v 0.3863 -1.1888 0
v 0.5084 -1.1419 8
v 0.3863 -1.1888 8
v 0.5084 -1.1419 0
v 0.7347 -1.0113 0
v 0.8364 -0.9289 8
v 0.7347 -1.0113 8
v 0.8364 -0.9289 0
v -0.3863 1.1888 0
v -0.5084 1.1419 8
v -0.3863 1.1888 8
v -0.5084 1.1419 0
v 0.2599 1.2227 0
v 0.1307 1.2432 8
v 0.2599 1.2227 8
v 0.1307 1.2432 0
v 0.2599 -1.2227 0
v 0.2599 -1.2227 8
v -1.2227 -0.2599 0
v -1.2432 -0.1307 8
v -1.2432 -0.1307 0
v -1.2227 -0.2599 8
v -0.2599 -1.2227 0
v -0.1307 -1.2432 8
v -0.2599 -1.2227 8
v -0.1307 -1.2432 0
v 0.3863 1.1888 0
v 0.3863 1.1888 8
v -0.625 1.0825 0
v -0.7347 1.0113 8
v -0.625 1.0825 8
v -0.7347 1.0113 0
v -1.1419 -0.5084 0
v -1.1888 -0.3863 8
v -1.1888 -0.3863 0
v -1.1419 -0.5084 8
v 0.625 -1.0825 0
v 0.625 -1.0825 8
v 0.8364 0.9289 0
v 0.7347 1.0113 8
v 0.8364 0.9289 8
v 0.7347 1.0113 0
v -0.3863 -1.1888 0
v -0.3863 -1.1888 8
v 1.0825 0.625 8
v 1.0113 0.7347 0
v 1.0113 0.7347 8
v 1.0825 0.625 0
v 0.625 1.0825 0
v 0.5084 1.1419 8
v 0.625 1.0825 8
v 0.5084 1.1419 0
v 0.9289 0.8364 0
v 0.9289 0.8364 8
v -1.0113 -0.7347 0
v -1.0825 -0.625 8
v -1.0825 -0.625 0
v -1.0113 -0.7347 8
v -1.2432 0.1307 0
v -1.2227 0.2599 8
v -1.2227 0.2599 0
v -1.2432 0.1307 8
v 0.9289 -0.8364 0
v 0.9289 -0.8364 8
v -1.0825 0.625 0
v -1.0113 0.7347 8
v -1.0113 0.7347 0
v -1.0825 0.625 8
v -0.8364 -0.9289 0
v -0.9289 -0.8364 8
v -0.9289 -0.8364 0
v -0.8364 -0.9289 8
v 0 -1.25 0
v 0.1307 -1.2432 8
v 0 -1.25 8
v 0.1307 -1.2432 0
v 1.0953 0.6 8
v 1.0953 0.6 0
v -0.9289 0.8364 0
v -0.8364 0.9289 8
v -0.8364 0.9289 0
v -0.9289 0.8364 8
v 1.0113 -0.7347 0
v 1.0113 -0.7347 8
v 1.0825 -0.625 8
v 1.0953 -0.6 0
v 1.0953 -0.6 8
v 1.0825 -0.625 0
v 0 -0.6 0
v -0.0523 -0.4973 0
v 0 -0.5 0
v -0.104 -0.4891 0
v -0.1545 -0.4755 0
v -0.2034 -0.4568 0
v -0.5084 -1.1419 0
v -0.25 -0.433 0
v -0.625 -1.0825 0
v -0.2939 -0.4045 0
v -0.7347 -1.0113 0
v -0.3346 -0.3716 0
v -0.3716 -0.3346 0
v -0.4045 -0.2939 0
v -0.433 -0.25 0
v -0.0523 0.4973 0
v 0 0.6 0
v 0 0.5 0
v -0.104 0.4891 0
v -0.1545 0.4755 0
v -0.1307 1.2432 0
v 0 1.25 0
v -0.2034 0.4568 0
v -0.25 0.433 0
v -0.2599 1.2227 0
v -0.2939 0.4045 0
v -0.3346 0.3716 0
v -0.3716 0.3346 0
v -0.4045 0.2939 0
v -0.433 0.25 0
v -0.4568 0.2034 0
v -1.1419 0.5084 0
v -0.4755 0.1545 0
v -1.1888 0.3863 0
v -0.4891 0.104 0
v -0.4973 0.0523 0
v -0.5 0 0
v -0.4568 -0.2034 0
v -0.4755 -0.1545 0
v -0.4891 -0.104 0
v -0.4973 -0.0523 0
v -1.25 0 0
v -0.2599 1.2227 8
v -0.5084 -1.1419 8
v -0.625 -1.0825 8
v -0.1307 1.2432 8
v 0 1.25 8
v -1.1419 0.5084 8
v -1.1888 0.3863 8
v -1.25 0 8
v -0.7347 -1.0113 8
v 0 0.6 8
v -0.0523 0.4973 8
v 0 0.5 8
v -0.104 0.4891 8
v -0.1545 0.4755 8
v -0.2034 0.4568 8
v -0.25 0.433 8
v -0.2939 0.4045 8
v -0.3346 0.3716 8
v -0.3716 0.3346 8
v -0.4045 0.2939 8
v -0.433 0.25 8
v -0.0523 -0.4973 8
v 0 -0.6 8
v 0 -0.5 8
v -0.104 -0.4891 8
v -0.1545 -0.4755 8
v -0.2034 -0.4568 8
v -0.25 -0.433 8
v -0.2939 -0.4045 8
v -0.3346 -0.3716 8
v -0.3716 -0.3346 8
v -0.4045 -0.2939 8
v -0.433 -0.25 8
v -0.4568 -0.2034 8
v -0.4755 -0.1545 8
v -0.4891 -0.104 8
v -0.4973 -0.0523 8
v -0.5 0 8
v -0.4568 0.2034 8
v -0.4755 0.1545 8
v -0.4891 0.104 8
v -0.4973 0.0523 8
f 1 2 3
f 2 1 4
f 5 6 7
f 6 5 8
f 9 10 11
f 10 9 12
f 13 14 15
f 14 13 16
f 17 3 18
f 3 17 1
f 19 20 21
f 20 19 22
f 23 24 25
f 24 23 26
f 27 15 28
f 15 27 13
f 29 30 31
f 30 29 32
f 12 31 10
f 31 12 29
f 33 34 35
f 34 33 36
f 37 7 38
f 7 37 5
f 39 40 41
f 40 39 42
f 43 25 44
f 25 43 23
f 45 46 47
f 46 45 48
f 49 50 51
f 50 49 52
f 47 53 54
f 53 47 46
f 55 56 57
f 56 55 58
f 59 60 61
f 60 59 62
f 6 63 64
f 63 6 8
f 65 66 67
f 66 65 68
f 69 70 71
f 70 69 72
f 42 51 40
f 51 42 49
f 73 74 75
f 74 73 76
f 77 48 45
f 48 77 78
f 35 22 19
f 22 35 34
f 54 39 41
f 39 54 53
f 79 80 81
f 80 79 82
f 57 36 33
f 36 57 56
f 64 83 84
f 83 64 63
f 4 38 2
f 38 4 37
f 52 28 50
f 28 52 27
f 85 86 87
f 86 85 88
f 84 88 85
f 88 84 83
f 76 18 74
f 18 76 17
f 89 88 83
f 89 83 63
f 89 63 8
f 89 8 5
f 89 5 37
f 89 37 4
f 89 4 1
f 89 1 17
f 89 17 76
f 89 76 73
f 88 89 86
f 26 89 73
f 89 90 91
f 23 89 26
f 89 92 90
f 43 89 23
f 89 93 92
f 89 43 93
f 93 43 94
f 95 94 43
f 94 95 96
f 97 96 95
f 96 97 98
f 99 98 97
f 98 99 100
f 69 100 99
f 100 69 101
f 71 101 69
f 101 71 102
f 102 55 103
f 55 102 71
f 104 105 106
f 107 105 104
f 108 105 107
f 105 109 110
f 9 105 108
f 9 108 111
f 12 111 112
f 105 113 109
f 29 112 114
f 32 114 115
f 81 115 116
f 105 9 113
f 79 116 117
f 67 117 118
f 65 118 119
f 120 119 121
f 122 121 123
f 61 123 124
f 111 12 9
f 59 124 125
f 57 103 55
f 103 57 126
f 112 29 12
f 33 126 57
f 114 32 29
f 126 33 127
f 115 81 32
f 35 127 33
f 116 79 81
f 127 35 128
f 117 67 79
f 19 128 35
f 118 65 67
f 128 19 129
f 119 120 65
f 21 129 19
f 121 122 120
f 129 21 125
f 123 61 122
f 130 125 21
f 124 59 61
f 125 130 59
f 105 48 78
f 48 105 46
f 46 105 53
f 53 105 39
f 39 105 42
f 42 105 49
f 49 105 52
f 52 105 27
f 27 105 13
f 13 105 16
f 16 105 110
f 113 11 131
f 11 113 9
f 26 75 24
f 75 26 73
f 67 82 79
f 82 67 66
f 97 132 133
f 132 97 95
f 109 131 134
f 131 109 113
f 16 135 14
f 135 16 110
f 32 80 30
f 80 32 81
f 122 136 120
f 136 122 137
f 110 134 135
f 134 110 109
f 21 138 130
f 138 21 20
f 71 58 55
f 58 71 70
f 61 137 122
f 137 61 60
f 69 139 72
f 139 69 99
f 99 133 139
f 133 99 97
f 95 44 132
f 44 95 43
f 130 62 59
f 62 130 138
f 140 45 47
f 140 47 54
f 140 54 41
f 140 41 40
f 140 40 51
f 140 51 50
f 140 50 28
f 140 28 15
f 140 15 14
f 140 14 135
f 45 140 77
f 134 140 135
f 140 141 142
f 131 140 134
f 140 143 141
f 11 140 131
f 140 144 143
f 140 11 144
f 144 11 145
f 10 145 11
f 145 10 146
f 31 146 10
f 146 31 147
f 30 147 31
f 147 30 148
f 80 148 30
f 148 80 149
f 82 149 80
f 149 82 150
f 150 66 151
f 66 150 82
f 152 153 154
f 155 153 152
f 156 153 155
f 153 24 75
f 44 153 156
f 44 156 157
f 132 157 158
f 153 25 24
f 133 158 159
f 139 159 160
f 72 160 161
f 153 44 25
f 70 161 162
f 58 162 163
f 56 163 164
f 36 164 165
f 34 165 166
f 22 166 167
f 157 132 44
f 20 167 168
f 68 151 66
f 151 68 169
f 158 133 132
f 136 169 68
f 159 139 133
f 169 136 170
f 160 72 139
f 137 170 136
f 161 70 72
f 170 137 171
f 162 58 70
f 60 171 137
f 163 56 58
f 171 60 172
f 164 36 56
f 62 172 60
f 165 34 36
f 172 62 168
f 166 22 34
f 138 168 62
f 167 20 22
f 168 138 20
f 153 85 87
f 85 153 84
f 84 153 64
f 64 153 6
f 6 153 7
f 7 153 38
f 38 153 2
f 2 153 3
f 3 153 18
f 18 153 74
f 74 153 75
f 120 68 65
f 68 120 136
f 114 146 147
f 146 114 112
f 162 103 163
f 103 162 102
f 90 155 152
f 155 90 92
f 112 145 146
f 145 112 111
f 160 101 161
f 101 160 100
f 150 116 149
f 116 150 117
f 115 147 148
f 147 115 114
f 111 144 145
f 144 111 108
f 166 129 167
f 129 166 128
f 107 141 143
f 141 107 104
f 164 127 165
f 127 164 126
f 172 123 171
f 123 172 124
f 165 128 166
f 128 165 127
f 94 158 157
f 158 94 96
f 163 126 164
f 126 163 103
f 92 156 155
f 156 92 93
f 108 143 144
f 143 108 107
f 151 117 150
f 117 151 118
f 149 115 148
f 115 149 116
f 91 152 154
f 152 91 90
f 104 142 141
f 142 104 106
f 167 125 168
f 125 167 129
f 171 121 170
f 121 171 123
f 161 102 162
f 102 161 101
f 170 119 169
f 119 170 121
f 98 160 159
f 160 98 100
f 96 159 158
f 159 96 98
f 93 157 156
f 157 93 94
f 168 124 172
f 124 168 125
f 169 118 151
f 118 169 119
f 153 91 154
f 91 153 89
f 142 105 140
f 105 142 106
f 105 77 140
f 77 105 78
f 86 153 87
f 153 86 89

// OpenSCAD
// Slotted spring pin sleeve.
$fn = 60;
eps = 0.02;
inner_d = 1;
outer_d = 2.5;
length = 8;
slot_w = 1.2;
difference() {
    cylinder(d = outer_d, h = length);
    translate([0, 0, -eps]) cylinder(d = inner_d, h = length + 2 * eps);
    translate([0, -slot_w / 2, -eps]) cube([outer_d / 2 + eps, slot_w, length + 2 * eps]);
}
